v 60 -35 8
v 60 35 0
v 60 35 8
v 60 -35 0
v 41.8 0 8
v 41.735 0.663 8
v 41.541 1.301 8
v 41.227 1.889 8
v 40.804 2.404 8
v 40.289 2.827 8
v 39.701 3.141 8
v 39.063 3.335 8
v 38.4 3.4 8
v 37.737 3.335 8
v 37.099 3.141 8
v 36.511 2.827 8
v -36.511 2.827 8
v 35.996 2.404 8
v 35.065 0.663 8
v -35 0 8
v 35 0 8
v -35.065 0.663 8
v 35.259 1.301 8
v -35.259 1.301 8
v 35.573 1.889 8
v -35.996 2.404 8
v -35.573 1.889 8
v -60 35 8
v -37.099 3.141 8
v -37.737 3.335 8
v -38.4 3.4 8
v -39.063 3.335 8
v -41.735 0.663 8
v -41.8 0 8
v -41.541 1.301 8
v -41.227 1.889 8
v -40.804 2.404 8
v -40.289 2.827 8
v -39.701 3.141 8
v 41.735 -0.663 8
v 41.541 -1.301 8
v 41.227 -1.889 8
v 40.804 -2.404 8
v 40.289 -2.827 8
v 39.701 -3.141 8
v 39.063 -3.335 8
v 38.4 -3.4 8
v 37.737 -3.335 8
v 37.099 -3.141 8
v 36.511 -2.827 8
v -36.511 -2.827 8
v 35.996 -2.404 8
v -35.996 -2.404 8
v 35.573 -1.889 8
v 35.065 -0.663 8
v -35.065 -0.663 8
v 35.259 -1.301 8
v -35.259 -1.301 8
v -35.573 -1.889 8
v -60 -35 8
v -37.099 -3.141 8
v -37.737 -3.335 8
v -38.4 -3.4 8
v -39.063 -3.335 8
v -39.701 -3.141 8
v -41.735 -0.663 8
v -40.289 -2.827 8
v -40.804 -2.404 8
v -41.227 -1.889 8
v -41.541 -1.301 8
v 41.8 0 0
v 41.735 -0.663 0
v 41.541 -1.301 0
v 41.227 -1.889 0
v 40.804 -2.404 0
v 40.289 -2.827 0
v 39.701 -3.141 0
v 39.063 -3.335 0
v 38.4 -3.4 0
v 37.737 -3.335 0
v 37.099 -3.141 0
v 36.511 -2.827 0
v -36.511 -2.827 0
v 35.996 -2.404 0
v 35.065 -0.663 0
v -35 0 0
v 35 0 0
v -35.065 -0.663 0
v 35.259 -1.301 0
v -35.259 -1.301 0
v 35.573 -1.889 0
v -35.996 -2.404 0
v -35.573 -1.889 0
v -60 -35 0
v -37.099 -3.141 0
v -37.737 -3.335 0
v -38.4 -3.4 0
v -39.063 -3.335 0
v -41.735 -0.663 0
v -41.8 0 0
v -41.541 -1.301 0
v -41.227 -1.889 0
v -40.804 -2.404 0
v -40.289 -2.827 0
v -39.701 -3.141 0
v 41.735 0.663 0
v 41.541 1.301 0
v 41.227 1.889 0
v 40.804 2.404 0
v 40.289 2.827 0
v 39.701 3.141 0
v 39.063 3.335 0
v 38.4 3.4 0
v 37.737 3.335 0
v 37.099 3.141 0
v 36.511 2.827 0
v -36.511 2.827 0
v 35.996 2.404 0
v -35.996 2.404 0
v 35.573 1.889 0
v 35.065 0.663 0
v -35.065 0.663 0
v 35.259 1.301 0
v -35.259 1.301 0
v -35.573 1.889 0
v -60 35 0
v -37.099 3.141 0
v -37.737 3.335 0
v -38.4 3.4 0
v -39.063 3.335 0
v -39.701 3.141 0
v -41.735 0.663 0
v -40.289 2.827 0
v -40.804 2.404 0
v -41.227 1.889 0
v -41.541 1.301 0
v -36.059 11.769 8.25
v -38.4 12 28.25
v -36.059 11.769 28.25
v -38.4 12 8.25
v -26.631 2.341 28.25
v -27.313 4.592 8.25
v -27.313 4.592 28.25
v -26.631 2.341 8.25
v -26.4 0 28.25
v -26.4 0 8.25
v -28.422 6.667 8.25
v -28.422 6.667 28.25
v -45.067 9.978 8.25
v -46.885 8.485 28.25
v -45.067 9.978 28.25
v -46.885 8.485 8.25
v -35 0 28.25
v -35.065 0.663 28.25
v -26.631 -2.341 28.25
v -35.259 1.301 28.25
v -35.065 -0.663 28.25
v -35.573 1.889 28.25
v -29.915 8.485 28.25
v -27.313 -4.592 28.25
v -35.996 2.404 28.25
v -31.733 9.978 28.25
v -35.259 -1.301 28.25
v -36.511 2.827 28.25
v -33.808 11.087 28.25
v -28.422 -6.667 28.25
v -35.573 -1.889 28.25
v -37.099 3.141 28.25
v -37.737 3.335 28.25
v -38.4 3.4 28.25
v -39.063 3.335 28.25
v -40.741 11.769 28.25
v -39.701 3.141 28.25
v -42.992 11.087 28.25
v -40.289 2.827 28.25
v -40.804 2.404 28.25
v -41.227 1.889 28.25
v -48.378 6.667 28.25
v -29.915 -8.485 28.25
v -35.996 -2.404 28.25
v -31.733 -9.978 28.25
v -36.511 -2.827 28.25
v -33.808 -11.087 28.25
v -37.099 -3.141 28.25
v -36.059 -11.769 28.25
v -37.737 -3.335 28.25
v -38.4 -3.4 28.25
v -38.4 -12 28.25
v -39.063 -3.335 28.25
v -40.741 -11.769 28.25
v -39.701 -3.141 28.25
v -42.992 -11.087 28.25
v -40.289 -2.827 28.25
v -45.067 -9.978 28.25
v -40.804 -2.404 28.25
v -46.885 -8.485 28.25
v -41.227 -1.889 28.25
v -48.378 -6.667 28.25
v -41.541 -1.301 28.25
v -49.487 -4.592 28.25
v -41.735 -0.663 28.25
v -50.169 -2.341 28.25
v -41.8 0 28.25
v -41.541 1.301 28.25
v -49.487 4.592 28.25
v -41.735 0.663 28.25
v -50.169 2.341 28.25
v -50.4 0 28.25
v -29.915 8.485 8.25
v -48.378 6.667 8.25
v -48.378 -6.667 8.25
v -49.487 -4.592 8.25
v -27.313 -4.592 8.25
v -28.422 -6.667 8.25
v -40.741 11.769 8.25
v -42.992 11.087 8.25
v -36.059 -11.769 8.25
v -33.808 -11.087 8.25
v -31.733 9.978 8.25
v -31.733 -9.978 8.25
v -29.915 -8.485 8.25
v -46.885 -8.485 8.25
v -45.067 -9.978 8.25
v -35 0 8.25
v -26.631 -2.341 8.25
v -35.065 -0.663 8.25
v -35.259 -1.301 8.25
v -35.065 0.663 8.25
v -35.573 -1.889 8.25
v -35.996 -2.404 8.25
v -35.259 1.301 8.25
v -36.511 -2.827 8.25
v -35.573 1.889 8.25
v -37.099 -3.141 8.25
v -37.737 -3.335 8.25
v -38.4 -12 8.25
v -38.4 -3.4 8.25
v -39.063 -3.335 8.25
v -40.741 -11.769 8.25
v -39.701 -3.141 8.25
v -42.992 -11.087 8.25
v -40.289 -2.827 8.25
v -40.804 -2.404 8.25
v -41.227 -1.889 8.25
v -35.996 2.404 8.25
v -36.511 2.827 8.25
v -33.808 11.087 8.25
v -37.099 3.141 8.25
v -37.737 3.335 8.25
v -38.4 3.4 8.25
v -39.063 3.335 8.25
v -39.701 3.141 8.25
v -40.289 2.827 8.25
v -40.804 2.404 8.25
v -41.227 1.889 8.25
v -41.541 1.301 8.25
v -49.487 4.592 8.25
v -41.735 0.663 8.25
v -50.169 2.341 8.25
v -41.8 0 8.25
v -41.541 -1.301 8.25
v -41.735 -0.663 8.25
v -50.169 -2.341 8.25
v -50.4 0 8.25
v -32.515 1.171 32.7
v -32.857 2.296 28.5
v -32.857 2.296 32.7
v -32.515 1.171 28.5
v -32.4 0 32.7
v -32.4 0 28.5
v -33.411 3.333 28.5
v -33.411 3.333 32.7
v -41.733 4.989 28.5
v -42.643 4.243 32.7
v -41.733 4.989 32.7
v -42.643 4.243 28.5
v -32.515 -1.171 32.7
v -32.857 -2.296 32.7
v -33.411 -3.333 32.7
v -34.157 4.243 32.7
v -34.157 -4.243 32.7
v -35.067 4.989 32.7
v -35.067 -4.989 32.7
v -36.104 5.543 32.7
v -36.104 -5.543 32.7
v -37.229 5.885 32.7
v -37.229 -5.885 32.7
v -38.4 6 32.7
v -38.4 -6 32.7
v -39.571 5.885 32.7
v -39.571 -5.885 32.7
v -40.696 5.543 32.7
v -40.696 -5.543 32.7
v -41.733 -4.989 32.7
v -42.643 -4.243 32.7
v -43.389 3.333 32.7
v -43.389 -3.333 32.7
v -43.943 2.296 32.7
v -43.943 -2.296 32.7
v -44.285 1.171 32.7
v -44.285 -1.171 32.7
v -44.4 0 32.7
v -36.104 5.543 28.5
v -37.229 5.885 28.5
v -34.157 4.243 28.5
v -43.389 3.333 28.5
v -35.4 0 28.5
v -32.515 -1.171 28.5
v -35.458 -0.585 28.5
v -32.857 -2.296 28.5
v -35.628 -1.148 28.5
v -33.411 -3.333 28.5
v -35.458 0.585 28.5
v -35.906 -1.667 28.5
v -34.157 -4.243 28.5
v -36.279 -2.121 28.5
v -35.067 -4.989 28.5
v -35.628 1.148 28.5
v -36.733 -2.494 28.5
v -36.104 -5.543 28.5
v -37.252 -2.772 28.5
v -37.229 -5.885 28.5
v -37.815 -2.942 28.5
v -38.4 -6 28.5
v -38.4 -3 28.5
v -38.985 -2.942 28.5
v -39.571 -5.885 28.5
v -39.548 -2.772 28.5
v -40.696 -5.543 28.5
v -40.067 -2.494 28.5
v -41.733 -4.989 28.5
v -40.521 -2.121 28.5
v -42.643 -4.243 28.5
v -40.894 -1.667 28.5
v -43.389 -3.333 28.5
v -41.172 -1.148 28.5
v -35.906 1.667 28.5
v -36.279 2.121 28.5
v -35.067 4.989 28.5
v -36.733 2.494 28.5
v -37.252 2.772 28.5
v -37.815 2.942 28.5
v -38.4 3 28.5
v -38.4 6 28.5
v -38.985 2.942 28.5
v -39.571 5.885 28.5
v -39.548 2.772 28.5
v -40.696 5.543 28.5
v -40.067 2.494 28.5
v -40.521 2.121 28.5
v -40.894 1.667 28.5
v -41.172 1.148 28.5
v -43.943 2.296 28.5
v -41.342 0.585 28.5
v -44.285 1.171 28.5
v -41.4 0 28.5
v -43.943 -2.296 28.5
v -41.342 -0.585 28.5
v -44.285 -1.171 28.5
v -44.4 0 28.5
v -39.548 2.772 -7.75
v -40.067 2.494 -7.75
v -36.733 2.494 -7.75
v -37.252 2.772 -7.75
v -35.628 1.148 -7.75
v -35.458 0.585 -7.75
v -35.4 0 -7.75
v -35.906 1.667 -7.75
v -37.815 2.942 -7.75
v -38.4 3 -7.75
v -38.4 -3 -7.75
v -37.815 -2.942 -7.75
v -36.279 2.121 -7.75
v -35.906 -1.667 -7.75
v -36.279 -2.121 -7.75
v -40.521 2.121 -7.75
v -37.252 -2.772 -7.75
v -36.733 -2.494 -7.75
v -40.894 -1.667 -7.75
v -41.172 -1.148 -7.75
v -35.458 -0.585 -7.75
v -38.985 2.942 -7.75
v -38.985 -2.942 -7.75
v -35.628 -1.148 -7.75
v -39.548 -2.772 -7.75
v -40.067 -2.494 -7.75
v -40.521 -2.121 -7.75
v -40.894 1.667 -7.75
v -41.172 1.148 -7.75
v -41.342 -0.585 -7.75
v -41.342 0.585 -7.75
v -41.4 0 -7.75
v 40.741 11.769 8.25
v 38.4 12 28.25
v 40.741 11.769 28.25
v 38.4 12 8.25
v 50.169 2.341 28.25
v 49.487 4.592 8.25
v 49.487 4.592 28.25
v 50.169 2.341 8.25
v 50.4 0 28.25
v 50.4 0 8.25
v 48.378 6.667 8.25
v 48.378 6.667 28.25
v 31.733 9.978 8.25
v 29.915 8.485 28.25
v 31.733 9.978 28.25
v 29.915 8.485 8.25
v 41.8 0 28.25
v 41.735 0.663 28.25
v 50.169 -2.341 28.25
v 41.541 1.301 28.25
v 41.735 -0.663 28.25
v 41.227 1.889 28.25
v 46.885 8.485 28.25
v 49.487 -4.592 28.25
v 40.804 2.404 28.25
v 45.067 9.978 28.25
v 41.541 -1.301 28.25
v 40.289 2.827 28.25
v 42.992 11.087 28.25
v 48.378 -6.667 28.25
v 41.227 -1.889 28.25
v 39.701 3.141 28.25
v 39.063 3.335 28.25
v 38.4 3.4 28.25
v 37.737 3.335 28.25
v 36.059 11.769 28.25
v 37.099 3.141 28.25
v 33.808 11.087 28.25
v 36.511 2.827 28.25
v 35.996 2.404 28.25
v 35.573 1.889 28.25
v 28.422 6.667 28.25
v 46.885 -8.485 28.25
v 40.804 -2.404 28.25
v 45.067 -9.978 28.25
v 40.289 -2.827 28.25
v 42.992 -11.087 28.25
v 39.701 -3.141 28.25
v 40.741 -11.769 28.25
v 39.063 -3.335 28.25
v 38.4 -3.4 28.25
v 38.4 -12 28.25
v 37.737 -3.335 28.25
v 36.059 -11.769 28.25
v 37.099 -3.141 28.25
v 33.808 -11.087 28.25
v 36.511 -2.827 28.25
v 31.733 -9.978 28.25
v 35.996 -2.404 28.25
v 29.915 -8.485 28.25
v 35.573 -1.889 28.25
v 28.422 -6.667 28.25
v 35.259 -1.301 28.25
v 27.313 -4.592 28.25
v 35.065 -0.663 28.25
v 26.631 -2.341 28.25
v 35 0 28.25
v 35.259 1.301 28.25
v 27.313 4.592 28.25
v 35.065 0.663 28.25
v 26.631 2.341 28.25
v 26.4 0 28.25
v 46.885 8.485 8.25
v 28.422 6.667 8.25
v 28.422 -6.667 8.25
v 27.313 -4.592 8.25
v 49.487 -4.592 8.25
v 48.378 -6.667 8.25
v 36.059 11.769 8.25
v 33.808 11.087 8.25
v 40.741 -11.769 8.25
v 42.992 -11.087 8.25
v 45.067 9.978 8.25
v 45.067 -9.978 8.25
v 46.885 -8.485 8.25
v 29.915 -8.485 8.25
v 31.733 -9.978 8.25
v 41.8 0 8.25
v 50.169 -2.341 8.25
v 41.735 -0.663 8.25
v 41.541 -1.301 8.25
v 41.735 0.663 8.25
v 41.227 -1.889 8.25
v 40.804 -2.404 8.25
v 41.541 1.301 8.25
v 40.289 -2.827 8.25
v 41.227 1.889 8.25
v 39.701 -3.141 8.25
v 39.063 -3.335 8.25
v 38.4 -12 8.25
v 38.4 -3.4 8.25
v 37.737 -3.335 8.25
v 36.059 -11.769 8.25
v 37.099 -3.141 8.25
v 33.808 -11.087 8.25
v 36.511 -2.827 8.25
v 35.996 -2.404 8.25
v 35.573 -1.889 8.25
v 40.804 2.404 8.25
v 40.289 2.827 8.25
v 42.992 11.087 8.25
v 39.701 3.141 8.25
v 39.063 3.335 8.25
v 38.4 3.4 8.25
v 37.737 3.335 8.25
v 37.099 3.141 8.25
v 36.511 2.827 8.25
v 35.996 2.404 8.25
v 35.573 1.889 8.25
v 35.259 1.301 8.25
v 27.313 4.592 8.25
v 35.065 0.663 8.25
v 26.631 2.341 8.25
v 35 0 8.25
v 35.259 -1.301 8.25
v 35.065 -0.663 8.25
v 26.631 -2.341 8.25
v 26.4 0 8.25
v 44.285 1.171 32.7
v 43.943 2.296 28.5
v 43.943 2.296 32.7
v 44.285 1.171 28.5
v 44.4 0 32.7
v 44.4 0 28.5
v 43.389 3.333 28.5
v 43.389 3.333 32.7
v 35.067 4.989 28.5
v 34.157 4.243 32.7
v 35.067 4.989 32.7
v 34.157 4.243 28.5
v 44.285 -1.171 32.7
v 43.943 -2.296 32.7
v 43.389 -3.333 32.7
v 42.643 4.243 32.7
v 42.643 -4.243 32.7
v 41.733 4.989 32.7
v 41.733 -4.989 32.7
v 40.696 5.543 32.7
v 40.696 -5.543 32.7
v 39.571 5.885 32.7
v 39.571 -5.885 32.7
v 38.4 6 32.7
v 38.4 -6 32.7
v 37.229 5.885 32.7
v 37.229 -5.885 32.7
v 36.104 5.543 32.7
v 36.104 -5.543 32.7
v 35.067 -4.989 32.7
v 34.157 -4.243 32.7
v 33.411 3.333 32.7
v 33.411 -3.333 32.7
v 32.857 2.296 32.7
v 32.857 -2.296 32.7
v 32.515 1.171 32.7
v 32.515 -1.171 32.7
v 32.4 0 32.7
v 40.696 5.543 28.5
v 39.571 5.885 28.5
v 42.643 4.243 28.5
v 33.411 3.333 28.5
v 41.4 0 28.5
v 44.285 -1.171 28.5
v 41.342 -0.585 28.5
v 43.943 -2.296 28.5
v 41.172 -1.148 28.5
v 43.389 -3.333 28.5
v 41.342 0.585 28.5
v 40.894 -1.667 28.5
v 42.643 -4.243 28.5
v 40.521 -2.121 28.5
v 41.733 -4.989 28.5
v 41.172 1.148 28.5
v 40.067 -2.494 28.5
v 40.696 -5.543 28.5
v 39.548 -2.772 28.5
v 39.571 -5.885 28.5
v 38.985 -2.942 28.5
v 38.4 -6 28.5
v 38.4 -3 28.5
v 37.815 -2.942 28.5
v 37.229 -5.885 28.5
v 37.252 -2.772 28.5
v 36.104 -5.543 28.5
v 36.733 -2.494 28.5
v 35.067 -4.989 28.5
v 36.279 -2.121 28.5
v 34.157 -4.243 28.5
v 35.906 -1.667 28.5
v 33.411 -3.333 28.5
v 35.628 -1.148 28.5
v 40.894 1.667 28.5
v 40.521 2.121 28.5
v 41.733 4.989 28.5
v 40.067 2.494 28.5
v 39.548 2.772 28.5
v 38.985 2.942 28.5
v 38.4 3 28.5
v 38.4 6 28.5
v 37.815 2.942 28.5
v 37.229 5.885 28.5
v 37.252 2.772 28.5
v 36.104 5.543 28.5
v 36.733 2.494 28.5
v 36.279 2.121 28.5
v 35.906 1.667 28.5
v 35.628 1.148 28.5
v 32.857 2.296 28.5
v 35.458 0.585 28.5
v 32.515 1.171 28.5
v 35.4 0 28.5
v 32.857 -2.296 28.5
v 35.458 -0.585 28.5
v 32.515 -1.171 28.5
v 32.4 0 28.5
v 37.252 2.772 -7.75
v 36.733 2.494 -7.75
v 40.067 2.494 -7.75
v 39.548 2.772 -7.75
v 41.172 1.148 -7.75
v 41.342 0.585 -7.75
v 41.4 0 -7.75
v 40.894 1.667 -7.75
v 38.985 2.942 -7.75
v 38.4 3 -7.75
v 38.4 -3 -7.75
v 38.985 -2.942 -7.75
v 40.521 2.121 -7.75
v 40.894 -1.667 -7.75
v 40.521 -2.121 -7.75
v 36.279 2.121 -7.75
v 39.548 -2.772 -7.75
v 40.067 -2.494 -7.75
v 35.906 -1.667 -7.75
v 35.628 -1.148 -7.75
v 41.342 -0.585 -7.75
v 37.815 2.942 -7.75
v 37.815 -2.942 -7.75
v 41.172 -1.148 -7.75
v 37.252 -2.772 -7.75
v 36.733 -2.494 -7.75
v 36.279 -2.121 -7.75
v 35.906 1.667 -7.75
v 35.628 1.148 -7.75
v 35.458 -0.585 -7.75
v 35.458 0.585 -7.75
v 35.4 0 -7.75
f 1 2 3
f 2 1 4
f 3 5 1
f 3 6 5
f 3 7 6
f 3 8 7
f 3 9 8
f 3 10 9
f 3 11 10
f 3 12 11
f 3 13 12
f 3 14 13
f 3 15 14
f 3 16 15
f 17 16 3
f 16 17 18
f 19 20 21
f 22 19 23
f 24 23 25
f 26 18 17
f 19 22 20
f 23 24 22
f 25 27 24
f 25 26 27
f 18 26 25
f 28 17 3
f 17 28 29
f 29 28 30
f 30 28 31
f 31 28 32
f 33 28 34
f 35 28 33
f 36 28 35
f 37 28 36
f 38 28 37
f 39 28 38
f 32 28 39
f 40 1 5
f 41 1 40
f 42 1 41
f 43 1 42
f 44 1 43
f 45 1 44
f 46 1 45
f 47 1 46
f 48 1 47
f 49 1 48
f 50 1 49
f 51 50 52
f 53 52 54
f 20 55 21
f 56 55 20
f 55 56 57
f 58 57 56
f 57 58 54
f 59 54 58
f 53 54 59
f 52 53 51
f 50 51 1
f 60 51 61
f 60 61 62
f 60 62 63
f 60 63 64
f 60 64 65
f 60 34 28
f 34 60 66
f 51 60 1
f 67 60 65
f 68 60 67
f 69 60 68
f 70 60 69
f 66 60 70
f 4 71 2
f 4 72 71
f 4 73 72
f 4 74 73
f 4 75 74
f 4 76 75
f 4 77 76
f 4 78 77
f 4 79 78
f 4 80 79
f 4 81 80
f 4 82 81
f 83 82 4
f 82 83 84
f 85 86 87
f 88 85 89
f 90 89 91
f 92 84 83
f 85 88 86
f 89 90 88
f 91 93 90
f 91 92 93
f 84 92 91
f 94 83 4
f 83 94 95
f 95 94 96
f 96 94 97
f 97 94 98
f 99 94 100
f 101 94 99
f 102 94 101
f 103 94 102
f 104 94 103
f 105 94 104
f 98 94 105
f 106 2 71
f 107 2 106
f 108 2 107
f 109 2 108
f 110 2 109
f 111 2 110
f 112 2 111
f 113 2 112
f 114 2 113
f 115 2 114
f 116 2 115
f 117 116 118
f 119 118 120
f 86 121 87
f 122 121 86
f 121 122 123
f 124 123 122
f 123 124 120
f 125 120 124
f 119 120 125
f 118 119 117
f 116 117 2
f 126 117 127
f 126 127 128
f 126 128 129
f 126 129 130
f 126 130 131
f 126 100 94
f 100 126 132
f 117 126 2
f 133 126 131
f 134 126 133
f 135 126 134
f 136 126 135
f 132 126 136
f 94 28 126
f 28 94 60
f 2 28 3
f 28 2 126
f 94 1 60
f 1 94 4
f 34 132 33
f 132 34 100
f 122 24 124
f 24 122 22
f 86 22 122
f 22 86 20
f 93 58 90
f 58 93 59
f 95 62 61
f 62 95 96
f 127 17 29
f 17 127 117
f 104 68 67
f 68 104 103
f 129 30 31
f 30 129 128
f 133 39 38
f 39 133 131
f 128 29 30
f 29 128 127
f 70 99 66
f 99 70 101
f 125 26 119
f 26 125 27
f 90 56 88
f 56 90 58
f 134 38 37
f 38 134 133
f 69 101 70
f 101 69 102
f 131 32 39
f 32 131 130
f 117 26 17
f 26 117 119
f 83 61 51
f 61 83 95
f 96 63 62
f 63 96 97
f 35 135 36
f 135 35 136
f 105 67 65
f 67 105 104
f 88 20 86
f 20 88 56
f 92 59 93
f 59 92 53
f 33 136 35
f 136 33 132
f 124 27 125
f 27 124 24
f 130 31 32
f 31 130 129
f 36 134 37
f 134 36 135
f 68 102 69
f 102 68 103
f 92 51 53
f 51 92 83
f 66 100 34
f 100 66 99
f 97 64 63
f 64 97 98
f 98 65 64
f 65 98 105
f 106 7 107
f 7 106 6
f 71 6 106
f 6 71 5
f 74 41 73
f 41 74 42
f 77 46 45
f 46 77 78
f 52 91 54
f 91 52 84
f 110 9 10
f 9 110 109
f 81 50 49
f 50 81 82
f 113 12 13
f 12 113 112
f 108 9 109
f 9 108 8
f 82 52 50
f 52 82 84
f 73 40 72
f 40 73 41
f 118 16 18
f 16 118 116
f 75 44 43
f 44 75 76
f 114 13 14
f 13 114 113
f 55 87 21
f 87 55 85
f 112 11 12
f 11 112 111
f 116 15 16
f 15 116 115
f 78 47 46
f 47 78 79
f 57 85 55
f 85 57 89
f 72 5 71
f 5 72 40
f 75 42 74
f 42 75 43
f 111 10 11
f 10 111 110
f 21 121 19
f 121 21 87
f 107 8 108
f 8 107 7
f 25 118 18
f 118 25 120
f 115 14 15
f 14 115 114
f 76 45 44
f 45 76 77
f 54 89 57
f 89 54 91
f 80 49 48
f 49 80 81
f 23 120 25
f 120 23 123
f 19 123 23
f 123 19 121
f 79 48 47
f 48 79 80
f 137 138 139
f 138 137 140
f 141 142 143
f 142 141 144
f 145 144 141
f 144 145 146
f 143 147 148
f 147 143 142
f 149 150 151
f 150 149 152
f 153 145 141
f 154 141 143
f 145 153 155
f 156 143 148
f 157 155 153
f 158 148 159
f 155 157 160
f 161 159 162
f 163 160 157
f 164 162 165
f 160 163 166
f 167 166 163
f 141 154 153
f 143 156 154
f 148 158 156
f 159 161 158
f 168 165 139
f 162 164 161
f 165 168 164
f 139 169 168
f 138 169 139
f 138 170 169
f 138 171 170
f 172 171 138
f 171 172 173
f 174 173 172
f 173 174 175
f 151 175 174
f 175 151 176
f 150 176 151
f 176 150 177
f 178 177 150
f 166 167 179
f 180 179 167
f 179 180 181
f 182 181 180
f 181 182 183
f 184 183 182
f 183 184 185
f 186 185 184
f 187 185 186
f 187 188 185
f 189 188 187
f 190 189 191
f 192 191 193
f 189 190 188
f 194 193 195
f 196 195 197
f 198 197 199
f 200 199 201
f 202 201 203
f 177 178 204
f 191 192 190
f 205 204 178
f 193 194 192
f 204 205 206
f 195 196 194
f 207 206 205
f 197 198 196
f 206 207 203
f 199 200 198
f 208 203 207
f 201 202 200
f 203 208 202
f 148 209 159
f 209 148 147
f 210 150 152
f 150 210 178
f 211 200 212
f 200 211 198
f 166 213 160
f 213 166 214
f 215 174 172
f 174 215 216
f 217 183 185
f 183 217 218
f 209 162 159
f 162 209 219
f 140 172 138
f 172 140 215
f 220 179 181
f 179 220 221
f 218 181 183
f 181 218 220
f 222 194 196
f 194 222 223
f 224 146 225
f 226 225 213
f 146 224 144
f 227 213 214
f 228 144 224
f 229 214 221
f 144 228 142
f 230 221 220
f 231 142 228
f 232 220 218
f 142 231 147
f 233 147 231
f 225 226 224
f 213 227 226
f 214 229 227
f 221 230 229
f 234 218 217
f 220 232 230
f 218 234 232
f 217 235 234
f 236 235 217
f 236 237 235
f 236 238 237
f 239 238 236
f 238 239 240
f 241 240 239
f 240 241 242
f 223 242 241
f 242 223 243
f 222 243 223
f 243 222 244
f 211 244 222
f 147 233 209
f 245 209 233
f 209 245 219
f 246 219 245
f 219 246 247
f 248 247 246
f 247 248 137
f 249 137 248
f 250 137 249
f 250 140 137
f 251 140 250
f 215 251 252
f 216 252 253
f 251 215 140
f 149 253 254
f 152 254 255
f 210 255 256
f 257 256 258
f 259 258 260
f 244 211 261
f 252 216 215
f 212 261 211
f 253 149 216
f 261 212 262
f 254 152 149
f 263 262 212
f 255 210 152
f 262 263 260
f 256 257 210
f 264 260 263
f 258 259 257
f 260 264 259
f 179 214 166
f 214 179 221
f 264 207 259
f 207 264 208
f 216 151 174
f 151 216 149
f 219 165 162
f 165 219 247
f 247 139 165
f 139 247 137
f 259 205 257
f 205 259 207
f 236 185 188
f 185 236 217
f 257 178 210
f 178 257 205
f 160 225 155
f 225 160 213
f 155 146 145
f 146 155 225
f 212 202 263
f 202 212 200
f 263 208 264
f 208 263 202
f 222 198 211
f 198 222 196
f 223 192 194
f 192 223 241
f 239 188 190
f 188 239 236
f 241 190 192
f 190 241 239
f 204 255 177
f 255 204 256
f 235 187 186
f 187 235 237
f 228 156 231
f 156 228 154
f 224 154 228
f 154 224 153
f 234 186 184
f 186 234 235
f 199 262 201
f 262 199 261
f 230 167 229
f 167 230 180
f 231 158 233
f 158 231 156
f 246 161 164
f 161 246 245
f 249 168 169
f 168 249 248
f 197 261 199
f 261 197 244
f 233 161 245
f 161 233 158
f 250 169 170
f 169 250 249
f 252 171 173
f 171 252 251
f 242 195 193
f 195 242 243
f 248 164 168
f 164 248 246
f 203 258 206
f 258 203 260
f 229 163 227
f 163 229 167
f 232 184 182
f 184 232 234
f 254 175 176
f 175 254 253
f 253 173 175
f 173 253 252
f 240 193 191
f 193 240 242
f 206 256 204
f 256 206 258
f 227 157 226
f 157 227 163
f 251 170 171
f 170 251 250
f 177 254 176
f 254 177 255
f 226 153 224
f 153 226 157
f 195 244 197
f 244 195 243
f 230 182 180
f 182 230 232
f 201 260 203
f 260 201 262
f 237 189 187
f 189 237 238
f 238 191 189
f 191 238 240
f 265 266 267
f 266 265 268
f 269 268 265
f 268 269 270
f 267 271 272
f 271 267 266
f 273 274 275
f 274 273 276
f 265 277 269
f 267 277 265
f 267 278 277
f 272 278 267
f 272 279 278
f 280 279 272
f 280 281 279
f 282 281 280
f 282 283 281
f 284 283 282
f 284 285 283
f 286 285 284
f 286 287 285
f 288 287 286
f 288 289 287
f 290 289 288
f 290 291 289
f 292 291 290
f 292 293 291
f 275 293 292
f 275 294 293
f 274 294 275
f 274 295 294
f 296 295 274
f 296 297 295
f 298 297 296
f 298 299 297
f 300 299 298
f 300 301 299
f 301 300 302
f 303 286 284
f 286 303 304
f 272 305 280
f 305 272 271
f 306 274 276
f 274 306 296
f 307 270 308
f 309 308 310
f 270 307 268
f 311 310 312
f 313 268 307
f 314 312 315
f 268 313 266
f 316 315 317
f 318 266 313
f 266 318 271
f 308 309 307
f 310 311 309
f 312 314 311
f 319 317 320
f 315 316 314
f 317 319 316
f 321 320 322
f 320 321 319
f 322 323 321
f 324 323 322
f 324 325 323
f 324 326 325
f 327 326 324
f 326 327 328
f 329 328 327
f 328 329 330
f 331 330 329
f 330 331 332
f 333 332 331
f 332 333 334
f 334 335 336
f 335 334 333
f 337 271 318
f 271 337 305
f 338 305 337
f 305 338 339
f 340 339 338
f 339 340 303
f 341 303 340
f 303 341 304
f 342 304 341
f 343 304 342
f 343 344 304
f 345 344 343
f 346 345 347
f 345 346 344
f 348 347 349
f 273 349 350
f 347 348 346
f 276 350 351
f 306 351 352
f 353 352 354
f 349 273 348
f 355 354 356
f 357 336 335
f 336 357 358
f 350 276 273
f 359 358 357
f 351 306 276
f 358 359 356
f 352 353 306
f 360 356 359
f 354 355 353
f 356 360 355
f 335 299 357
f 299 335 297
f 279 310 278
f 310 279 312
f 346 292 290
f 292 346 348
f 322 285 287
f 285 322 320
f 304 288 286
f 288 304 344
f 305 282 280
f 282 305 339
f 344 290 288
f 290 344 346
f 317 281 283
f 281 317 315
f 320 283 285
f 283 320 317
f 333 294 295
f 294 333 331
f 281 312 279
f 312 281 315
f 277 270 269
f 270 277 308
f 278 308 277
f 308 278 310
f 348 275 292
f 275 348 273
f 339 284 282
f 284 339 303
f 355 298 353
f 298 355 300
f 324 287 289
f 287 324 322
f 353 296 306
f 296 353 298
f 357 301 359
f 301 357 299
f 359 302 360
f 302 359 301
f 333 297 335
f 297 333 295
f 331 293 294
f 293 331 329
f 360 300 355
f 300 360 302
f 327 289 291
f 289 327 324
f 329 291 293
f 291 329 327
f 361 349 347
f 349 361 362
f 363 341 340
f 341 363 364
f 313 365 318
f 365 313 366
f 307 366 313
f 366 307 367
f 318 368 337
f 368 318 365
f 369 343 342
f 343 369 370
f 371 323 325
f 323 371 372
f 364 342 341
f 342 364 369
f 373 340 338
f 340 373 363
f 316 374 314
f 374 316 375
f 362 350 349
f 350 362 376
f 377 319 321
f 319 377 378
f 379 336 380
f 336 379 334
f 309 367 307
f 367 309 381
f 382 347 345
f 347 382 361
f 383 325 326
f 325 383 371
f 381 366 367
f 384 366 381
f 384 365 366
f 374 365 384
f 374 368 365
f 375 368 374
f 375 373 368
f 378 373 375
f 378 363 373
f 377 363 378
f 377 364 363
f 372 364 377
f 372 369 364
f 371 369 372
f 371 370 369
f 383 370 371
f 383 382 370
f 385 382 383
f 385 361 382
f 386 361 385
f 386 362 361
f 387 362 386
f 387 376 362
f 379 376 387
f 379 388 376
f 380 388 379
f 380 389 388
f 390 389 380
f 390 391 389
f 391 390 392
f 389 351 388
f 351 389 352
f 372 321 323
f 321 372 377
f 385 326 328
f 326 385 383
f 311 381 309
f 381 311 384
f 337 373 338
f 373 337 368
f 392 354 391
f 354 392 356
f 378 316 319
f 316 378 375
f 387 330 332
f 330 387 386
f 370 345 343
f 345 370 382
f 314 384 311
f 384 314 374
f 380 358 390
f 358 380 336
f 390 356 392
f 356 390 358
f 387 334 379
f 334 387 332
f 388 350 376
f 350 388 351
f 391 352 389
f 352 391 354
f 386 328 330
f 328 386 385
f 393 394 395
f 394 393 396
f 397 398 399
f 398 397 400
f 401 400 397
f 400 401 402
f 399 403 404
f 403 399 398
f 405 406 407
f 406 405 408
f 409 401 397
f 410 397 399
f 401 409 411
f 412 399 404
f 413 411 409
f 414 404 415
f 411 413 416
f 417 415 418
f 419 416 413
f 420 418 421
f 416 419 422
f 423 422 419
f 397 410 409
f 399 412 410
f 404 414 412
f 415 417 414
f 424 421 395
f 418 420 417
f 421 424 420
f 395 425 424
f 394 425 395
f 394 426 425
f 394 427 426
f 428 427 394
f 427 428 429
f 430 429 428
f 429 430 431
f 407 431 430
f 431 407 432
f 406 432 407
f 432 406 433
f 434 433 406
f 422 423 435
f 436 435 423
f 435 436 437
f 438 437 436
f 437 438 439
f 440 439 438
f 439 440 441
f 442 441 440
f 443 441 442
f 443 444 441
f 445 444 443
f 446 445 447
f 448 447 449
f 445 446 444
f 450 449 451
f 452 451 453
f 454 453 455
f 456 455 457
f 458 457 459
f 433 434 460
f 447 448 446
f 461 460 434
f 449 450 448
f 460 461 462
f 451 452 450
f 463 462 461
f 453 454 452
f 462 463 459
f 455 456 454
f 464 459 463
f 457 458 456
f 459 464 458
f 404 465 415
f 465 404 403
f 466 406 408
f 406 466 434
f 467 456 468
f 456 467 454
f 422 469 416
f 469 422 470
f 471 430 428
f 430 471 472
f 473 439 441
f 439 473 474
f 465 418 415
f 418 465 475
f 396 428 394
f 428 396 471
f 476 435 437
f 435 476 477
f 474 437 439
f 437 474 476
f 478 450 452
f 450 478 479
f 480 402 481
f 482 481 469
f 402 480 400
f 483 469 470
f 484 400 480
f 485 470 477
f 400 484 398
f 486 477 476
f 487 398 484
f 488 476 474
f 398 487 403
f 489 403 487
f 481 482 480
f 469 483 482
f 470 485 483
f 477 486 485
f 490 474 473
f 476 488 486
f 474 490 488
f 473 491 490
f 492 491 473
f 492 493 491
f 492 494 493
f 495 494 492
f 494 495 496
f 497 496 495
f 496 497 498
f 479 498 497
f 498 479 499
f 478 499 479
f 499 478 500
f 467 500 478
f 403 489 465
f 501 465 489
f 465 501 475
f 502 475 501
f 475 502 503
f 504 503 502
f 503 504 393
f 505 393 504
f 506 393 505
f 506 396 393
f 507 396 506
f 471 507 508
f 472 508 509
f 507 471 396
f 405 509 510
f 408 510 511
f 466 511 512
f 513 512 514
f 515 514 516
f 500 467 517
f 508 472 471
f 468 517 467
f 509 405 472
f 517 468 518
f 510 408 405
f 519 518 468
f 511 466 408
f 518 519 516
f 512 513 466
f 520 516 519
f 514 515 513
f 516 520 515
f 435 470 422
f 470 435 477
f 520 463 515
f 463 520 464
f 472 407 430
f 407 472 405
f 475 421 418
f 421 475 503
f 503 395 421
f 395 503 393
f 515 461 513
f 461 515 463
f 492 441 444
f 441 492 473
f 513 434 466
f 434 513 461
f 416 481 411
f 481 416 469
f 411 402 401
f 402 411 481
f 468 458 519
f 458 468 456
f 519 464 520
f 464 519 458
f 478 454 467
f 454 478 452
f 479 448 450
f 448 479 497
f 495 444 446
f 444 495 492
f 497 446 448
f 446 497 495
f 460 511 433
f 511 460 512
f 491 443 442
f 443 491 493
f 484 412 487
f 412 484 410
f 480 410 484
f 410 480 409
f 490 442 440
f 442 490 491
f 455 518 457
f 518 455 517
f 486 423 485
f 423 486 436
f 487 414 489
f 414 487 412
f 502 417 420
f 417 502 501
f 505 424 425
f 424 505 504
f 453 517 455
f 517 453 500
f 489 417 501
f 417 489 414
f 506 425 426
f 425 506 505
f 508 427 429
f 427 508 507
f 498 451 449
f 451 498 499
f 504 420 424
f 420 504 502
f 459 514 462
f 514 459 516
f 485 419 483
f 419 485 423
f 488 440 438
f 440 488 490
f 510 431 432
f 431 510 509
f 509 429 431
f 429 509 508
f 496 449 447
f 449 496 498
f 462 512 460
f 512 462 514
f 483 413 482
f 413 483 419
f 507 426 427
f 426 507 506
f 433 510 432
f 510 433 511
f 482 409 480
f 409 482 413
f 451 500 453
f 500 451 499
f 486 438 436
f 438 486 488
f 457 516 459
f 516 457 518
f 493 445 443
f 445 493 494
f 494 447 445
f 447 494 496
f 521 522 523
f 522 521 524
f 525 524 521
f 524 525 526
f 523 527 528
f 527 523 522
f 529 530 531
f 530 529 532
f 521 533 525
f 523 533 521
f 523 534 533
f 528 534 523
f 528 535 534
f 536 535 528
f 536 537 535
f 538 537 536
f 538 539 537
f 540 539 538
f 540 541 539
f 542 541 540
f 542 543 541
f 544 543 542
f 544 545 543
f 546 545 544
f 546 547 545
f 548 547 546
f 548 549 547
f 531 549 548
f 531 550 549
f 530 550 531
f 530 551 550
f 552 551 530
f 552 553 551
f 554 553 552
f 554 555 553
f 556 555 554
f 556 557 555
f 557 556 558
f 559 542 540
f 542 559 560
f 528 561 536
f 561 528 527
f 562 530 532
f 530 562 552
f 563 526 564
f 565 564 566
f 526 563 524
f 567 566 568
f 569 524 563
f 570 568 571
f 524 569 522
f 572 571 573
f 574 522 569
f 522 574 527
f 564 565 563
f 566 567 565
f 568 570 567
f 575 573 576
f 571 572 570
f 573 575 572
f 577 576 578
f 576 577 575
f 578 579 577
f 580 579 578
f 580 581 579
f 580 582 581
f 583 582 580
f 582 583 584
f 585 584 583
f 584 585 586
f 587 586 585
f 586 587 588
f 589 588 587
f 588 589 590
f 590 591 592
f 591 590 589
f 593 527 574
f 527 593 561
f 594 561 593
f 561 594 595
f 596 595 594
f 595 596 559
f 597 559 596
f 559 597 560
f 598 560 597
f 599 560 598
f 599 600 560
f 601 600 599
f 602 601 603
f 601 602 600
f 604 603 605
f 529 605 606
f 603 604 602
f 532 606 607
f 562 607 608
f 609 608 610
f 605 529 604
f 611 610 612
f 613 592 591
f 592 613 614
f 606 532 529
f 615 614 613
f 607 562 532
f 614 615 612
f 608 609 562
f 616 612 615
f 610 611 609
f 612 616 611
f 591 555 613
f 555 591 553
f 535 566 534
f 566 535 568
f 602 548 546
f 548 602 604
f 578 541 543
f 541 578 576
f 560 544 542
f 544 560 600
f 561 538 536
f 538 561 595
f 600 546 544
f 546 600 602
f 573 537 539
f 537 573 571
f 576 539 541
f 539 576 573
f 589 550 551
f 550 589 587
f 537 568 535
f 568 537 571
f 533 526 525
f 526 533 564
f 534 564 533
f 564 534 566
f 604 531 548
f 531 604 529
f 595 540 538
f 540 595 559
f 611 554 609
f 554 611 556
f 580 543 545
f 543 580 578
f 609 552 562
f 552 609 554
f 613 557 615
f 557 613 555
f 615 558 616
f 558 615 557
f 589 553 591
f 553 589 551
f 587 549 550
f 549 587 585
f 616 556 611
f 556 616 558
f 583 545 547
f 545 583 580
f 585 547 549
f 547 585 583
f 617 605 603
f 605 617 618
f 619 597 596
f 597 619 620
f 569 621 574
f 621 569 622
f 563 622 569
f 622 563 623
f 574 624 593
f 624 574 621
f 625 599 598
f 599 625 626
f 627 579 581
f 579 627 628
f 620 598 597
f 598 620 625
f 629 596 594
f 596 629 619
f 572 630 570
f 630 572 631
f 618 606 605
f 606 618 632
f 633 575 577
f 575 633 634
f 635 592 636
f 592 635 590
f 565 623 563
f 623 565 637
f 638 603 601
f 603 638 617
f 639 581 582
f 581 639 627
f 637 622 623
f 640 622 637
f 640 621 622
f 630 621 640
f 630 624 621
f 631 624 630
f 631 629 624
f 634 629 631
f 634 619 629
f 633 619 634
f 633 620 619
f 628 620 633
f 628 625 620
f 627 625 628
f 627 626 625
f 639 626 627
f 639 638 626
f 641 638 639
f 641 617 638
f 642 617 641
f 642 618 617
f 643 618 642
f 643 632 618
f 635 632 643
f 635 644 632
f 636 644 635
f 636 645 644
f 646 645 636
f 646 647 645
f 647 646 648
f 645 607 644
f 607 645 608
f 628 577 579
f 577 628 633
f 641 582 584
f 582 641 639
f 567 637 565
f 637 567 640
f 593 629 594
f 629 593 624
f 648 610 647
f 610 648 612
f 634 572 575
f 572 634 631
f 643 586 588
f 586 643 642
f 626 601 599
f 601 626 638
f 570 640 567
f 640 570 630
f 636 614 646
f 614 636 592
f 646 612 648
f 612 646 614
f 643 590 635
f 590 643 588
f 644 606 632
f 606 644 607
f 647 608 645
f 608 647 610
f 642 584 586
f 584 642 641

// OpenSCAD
$fn = 32;

// ------------------------------------------------------------------------
// Standoff columns: 2 d24 standoffs, bolts d6
// Every part is its own module, assembly() places them once.
// ------------------------------------------------------------------------

// --- part 1 ---
module base_plate() {
  difference() {
    translate([-60, -35, 0]) cube([120, 70, 8]);
    translate([-38.4, 0, -1]) cylinder(h = 10, d = 6.8);
    translate([38.4, 0, -1]) cylinder(h = 10, d = 6.8);
  }
}

// --- part 2 ---
module spacer1() {
  difference() {
      translate([0, 0, 0]) cylinder(h = 20, d = 24);
      translate([0, 0, -1]) cylinder(h = 22, d = 6.8);
    }
}

// --- part 3 ---
module bolt1() {
  cylinder(h = 4.2, d = 12);
  translate([0, 0, -36.25]) cylinder(h = 36.25, d = 6);
}

// --- part 4 ---
module spacer2() {
  difference() {
      translate([0, 0, 0]) cylinder(h = 20, d = 24);
      translate([0, 0, -1]) cylinder(h = 22, d = 6.8);
    }
}

// --- part 5 ---
module bolt2() {
  cylinder(h = 4.2, d = 12);
  translate([0, 0, -36.25]) cylinder(h = 36.25, d = 6);
}

// --- assembly ---
module assembly() {
  translate([0, 0, 0]) rotate([0, 0, 0]) base_plate();
  translate([-38.4, 0, 8.25]) rotate([0, 0, 0]) spacer1();
  translate([-38.4, 0, 28.5]) rotate([0, 0, 0]) bolt1();
  translate([38.4, 0, 8.25]) rotate([0, 0, 0]) spacer2();
  translate([38.4, 0, 28.5]) rotate([0, 0, 0]) bolt2();
}

assembly();
